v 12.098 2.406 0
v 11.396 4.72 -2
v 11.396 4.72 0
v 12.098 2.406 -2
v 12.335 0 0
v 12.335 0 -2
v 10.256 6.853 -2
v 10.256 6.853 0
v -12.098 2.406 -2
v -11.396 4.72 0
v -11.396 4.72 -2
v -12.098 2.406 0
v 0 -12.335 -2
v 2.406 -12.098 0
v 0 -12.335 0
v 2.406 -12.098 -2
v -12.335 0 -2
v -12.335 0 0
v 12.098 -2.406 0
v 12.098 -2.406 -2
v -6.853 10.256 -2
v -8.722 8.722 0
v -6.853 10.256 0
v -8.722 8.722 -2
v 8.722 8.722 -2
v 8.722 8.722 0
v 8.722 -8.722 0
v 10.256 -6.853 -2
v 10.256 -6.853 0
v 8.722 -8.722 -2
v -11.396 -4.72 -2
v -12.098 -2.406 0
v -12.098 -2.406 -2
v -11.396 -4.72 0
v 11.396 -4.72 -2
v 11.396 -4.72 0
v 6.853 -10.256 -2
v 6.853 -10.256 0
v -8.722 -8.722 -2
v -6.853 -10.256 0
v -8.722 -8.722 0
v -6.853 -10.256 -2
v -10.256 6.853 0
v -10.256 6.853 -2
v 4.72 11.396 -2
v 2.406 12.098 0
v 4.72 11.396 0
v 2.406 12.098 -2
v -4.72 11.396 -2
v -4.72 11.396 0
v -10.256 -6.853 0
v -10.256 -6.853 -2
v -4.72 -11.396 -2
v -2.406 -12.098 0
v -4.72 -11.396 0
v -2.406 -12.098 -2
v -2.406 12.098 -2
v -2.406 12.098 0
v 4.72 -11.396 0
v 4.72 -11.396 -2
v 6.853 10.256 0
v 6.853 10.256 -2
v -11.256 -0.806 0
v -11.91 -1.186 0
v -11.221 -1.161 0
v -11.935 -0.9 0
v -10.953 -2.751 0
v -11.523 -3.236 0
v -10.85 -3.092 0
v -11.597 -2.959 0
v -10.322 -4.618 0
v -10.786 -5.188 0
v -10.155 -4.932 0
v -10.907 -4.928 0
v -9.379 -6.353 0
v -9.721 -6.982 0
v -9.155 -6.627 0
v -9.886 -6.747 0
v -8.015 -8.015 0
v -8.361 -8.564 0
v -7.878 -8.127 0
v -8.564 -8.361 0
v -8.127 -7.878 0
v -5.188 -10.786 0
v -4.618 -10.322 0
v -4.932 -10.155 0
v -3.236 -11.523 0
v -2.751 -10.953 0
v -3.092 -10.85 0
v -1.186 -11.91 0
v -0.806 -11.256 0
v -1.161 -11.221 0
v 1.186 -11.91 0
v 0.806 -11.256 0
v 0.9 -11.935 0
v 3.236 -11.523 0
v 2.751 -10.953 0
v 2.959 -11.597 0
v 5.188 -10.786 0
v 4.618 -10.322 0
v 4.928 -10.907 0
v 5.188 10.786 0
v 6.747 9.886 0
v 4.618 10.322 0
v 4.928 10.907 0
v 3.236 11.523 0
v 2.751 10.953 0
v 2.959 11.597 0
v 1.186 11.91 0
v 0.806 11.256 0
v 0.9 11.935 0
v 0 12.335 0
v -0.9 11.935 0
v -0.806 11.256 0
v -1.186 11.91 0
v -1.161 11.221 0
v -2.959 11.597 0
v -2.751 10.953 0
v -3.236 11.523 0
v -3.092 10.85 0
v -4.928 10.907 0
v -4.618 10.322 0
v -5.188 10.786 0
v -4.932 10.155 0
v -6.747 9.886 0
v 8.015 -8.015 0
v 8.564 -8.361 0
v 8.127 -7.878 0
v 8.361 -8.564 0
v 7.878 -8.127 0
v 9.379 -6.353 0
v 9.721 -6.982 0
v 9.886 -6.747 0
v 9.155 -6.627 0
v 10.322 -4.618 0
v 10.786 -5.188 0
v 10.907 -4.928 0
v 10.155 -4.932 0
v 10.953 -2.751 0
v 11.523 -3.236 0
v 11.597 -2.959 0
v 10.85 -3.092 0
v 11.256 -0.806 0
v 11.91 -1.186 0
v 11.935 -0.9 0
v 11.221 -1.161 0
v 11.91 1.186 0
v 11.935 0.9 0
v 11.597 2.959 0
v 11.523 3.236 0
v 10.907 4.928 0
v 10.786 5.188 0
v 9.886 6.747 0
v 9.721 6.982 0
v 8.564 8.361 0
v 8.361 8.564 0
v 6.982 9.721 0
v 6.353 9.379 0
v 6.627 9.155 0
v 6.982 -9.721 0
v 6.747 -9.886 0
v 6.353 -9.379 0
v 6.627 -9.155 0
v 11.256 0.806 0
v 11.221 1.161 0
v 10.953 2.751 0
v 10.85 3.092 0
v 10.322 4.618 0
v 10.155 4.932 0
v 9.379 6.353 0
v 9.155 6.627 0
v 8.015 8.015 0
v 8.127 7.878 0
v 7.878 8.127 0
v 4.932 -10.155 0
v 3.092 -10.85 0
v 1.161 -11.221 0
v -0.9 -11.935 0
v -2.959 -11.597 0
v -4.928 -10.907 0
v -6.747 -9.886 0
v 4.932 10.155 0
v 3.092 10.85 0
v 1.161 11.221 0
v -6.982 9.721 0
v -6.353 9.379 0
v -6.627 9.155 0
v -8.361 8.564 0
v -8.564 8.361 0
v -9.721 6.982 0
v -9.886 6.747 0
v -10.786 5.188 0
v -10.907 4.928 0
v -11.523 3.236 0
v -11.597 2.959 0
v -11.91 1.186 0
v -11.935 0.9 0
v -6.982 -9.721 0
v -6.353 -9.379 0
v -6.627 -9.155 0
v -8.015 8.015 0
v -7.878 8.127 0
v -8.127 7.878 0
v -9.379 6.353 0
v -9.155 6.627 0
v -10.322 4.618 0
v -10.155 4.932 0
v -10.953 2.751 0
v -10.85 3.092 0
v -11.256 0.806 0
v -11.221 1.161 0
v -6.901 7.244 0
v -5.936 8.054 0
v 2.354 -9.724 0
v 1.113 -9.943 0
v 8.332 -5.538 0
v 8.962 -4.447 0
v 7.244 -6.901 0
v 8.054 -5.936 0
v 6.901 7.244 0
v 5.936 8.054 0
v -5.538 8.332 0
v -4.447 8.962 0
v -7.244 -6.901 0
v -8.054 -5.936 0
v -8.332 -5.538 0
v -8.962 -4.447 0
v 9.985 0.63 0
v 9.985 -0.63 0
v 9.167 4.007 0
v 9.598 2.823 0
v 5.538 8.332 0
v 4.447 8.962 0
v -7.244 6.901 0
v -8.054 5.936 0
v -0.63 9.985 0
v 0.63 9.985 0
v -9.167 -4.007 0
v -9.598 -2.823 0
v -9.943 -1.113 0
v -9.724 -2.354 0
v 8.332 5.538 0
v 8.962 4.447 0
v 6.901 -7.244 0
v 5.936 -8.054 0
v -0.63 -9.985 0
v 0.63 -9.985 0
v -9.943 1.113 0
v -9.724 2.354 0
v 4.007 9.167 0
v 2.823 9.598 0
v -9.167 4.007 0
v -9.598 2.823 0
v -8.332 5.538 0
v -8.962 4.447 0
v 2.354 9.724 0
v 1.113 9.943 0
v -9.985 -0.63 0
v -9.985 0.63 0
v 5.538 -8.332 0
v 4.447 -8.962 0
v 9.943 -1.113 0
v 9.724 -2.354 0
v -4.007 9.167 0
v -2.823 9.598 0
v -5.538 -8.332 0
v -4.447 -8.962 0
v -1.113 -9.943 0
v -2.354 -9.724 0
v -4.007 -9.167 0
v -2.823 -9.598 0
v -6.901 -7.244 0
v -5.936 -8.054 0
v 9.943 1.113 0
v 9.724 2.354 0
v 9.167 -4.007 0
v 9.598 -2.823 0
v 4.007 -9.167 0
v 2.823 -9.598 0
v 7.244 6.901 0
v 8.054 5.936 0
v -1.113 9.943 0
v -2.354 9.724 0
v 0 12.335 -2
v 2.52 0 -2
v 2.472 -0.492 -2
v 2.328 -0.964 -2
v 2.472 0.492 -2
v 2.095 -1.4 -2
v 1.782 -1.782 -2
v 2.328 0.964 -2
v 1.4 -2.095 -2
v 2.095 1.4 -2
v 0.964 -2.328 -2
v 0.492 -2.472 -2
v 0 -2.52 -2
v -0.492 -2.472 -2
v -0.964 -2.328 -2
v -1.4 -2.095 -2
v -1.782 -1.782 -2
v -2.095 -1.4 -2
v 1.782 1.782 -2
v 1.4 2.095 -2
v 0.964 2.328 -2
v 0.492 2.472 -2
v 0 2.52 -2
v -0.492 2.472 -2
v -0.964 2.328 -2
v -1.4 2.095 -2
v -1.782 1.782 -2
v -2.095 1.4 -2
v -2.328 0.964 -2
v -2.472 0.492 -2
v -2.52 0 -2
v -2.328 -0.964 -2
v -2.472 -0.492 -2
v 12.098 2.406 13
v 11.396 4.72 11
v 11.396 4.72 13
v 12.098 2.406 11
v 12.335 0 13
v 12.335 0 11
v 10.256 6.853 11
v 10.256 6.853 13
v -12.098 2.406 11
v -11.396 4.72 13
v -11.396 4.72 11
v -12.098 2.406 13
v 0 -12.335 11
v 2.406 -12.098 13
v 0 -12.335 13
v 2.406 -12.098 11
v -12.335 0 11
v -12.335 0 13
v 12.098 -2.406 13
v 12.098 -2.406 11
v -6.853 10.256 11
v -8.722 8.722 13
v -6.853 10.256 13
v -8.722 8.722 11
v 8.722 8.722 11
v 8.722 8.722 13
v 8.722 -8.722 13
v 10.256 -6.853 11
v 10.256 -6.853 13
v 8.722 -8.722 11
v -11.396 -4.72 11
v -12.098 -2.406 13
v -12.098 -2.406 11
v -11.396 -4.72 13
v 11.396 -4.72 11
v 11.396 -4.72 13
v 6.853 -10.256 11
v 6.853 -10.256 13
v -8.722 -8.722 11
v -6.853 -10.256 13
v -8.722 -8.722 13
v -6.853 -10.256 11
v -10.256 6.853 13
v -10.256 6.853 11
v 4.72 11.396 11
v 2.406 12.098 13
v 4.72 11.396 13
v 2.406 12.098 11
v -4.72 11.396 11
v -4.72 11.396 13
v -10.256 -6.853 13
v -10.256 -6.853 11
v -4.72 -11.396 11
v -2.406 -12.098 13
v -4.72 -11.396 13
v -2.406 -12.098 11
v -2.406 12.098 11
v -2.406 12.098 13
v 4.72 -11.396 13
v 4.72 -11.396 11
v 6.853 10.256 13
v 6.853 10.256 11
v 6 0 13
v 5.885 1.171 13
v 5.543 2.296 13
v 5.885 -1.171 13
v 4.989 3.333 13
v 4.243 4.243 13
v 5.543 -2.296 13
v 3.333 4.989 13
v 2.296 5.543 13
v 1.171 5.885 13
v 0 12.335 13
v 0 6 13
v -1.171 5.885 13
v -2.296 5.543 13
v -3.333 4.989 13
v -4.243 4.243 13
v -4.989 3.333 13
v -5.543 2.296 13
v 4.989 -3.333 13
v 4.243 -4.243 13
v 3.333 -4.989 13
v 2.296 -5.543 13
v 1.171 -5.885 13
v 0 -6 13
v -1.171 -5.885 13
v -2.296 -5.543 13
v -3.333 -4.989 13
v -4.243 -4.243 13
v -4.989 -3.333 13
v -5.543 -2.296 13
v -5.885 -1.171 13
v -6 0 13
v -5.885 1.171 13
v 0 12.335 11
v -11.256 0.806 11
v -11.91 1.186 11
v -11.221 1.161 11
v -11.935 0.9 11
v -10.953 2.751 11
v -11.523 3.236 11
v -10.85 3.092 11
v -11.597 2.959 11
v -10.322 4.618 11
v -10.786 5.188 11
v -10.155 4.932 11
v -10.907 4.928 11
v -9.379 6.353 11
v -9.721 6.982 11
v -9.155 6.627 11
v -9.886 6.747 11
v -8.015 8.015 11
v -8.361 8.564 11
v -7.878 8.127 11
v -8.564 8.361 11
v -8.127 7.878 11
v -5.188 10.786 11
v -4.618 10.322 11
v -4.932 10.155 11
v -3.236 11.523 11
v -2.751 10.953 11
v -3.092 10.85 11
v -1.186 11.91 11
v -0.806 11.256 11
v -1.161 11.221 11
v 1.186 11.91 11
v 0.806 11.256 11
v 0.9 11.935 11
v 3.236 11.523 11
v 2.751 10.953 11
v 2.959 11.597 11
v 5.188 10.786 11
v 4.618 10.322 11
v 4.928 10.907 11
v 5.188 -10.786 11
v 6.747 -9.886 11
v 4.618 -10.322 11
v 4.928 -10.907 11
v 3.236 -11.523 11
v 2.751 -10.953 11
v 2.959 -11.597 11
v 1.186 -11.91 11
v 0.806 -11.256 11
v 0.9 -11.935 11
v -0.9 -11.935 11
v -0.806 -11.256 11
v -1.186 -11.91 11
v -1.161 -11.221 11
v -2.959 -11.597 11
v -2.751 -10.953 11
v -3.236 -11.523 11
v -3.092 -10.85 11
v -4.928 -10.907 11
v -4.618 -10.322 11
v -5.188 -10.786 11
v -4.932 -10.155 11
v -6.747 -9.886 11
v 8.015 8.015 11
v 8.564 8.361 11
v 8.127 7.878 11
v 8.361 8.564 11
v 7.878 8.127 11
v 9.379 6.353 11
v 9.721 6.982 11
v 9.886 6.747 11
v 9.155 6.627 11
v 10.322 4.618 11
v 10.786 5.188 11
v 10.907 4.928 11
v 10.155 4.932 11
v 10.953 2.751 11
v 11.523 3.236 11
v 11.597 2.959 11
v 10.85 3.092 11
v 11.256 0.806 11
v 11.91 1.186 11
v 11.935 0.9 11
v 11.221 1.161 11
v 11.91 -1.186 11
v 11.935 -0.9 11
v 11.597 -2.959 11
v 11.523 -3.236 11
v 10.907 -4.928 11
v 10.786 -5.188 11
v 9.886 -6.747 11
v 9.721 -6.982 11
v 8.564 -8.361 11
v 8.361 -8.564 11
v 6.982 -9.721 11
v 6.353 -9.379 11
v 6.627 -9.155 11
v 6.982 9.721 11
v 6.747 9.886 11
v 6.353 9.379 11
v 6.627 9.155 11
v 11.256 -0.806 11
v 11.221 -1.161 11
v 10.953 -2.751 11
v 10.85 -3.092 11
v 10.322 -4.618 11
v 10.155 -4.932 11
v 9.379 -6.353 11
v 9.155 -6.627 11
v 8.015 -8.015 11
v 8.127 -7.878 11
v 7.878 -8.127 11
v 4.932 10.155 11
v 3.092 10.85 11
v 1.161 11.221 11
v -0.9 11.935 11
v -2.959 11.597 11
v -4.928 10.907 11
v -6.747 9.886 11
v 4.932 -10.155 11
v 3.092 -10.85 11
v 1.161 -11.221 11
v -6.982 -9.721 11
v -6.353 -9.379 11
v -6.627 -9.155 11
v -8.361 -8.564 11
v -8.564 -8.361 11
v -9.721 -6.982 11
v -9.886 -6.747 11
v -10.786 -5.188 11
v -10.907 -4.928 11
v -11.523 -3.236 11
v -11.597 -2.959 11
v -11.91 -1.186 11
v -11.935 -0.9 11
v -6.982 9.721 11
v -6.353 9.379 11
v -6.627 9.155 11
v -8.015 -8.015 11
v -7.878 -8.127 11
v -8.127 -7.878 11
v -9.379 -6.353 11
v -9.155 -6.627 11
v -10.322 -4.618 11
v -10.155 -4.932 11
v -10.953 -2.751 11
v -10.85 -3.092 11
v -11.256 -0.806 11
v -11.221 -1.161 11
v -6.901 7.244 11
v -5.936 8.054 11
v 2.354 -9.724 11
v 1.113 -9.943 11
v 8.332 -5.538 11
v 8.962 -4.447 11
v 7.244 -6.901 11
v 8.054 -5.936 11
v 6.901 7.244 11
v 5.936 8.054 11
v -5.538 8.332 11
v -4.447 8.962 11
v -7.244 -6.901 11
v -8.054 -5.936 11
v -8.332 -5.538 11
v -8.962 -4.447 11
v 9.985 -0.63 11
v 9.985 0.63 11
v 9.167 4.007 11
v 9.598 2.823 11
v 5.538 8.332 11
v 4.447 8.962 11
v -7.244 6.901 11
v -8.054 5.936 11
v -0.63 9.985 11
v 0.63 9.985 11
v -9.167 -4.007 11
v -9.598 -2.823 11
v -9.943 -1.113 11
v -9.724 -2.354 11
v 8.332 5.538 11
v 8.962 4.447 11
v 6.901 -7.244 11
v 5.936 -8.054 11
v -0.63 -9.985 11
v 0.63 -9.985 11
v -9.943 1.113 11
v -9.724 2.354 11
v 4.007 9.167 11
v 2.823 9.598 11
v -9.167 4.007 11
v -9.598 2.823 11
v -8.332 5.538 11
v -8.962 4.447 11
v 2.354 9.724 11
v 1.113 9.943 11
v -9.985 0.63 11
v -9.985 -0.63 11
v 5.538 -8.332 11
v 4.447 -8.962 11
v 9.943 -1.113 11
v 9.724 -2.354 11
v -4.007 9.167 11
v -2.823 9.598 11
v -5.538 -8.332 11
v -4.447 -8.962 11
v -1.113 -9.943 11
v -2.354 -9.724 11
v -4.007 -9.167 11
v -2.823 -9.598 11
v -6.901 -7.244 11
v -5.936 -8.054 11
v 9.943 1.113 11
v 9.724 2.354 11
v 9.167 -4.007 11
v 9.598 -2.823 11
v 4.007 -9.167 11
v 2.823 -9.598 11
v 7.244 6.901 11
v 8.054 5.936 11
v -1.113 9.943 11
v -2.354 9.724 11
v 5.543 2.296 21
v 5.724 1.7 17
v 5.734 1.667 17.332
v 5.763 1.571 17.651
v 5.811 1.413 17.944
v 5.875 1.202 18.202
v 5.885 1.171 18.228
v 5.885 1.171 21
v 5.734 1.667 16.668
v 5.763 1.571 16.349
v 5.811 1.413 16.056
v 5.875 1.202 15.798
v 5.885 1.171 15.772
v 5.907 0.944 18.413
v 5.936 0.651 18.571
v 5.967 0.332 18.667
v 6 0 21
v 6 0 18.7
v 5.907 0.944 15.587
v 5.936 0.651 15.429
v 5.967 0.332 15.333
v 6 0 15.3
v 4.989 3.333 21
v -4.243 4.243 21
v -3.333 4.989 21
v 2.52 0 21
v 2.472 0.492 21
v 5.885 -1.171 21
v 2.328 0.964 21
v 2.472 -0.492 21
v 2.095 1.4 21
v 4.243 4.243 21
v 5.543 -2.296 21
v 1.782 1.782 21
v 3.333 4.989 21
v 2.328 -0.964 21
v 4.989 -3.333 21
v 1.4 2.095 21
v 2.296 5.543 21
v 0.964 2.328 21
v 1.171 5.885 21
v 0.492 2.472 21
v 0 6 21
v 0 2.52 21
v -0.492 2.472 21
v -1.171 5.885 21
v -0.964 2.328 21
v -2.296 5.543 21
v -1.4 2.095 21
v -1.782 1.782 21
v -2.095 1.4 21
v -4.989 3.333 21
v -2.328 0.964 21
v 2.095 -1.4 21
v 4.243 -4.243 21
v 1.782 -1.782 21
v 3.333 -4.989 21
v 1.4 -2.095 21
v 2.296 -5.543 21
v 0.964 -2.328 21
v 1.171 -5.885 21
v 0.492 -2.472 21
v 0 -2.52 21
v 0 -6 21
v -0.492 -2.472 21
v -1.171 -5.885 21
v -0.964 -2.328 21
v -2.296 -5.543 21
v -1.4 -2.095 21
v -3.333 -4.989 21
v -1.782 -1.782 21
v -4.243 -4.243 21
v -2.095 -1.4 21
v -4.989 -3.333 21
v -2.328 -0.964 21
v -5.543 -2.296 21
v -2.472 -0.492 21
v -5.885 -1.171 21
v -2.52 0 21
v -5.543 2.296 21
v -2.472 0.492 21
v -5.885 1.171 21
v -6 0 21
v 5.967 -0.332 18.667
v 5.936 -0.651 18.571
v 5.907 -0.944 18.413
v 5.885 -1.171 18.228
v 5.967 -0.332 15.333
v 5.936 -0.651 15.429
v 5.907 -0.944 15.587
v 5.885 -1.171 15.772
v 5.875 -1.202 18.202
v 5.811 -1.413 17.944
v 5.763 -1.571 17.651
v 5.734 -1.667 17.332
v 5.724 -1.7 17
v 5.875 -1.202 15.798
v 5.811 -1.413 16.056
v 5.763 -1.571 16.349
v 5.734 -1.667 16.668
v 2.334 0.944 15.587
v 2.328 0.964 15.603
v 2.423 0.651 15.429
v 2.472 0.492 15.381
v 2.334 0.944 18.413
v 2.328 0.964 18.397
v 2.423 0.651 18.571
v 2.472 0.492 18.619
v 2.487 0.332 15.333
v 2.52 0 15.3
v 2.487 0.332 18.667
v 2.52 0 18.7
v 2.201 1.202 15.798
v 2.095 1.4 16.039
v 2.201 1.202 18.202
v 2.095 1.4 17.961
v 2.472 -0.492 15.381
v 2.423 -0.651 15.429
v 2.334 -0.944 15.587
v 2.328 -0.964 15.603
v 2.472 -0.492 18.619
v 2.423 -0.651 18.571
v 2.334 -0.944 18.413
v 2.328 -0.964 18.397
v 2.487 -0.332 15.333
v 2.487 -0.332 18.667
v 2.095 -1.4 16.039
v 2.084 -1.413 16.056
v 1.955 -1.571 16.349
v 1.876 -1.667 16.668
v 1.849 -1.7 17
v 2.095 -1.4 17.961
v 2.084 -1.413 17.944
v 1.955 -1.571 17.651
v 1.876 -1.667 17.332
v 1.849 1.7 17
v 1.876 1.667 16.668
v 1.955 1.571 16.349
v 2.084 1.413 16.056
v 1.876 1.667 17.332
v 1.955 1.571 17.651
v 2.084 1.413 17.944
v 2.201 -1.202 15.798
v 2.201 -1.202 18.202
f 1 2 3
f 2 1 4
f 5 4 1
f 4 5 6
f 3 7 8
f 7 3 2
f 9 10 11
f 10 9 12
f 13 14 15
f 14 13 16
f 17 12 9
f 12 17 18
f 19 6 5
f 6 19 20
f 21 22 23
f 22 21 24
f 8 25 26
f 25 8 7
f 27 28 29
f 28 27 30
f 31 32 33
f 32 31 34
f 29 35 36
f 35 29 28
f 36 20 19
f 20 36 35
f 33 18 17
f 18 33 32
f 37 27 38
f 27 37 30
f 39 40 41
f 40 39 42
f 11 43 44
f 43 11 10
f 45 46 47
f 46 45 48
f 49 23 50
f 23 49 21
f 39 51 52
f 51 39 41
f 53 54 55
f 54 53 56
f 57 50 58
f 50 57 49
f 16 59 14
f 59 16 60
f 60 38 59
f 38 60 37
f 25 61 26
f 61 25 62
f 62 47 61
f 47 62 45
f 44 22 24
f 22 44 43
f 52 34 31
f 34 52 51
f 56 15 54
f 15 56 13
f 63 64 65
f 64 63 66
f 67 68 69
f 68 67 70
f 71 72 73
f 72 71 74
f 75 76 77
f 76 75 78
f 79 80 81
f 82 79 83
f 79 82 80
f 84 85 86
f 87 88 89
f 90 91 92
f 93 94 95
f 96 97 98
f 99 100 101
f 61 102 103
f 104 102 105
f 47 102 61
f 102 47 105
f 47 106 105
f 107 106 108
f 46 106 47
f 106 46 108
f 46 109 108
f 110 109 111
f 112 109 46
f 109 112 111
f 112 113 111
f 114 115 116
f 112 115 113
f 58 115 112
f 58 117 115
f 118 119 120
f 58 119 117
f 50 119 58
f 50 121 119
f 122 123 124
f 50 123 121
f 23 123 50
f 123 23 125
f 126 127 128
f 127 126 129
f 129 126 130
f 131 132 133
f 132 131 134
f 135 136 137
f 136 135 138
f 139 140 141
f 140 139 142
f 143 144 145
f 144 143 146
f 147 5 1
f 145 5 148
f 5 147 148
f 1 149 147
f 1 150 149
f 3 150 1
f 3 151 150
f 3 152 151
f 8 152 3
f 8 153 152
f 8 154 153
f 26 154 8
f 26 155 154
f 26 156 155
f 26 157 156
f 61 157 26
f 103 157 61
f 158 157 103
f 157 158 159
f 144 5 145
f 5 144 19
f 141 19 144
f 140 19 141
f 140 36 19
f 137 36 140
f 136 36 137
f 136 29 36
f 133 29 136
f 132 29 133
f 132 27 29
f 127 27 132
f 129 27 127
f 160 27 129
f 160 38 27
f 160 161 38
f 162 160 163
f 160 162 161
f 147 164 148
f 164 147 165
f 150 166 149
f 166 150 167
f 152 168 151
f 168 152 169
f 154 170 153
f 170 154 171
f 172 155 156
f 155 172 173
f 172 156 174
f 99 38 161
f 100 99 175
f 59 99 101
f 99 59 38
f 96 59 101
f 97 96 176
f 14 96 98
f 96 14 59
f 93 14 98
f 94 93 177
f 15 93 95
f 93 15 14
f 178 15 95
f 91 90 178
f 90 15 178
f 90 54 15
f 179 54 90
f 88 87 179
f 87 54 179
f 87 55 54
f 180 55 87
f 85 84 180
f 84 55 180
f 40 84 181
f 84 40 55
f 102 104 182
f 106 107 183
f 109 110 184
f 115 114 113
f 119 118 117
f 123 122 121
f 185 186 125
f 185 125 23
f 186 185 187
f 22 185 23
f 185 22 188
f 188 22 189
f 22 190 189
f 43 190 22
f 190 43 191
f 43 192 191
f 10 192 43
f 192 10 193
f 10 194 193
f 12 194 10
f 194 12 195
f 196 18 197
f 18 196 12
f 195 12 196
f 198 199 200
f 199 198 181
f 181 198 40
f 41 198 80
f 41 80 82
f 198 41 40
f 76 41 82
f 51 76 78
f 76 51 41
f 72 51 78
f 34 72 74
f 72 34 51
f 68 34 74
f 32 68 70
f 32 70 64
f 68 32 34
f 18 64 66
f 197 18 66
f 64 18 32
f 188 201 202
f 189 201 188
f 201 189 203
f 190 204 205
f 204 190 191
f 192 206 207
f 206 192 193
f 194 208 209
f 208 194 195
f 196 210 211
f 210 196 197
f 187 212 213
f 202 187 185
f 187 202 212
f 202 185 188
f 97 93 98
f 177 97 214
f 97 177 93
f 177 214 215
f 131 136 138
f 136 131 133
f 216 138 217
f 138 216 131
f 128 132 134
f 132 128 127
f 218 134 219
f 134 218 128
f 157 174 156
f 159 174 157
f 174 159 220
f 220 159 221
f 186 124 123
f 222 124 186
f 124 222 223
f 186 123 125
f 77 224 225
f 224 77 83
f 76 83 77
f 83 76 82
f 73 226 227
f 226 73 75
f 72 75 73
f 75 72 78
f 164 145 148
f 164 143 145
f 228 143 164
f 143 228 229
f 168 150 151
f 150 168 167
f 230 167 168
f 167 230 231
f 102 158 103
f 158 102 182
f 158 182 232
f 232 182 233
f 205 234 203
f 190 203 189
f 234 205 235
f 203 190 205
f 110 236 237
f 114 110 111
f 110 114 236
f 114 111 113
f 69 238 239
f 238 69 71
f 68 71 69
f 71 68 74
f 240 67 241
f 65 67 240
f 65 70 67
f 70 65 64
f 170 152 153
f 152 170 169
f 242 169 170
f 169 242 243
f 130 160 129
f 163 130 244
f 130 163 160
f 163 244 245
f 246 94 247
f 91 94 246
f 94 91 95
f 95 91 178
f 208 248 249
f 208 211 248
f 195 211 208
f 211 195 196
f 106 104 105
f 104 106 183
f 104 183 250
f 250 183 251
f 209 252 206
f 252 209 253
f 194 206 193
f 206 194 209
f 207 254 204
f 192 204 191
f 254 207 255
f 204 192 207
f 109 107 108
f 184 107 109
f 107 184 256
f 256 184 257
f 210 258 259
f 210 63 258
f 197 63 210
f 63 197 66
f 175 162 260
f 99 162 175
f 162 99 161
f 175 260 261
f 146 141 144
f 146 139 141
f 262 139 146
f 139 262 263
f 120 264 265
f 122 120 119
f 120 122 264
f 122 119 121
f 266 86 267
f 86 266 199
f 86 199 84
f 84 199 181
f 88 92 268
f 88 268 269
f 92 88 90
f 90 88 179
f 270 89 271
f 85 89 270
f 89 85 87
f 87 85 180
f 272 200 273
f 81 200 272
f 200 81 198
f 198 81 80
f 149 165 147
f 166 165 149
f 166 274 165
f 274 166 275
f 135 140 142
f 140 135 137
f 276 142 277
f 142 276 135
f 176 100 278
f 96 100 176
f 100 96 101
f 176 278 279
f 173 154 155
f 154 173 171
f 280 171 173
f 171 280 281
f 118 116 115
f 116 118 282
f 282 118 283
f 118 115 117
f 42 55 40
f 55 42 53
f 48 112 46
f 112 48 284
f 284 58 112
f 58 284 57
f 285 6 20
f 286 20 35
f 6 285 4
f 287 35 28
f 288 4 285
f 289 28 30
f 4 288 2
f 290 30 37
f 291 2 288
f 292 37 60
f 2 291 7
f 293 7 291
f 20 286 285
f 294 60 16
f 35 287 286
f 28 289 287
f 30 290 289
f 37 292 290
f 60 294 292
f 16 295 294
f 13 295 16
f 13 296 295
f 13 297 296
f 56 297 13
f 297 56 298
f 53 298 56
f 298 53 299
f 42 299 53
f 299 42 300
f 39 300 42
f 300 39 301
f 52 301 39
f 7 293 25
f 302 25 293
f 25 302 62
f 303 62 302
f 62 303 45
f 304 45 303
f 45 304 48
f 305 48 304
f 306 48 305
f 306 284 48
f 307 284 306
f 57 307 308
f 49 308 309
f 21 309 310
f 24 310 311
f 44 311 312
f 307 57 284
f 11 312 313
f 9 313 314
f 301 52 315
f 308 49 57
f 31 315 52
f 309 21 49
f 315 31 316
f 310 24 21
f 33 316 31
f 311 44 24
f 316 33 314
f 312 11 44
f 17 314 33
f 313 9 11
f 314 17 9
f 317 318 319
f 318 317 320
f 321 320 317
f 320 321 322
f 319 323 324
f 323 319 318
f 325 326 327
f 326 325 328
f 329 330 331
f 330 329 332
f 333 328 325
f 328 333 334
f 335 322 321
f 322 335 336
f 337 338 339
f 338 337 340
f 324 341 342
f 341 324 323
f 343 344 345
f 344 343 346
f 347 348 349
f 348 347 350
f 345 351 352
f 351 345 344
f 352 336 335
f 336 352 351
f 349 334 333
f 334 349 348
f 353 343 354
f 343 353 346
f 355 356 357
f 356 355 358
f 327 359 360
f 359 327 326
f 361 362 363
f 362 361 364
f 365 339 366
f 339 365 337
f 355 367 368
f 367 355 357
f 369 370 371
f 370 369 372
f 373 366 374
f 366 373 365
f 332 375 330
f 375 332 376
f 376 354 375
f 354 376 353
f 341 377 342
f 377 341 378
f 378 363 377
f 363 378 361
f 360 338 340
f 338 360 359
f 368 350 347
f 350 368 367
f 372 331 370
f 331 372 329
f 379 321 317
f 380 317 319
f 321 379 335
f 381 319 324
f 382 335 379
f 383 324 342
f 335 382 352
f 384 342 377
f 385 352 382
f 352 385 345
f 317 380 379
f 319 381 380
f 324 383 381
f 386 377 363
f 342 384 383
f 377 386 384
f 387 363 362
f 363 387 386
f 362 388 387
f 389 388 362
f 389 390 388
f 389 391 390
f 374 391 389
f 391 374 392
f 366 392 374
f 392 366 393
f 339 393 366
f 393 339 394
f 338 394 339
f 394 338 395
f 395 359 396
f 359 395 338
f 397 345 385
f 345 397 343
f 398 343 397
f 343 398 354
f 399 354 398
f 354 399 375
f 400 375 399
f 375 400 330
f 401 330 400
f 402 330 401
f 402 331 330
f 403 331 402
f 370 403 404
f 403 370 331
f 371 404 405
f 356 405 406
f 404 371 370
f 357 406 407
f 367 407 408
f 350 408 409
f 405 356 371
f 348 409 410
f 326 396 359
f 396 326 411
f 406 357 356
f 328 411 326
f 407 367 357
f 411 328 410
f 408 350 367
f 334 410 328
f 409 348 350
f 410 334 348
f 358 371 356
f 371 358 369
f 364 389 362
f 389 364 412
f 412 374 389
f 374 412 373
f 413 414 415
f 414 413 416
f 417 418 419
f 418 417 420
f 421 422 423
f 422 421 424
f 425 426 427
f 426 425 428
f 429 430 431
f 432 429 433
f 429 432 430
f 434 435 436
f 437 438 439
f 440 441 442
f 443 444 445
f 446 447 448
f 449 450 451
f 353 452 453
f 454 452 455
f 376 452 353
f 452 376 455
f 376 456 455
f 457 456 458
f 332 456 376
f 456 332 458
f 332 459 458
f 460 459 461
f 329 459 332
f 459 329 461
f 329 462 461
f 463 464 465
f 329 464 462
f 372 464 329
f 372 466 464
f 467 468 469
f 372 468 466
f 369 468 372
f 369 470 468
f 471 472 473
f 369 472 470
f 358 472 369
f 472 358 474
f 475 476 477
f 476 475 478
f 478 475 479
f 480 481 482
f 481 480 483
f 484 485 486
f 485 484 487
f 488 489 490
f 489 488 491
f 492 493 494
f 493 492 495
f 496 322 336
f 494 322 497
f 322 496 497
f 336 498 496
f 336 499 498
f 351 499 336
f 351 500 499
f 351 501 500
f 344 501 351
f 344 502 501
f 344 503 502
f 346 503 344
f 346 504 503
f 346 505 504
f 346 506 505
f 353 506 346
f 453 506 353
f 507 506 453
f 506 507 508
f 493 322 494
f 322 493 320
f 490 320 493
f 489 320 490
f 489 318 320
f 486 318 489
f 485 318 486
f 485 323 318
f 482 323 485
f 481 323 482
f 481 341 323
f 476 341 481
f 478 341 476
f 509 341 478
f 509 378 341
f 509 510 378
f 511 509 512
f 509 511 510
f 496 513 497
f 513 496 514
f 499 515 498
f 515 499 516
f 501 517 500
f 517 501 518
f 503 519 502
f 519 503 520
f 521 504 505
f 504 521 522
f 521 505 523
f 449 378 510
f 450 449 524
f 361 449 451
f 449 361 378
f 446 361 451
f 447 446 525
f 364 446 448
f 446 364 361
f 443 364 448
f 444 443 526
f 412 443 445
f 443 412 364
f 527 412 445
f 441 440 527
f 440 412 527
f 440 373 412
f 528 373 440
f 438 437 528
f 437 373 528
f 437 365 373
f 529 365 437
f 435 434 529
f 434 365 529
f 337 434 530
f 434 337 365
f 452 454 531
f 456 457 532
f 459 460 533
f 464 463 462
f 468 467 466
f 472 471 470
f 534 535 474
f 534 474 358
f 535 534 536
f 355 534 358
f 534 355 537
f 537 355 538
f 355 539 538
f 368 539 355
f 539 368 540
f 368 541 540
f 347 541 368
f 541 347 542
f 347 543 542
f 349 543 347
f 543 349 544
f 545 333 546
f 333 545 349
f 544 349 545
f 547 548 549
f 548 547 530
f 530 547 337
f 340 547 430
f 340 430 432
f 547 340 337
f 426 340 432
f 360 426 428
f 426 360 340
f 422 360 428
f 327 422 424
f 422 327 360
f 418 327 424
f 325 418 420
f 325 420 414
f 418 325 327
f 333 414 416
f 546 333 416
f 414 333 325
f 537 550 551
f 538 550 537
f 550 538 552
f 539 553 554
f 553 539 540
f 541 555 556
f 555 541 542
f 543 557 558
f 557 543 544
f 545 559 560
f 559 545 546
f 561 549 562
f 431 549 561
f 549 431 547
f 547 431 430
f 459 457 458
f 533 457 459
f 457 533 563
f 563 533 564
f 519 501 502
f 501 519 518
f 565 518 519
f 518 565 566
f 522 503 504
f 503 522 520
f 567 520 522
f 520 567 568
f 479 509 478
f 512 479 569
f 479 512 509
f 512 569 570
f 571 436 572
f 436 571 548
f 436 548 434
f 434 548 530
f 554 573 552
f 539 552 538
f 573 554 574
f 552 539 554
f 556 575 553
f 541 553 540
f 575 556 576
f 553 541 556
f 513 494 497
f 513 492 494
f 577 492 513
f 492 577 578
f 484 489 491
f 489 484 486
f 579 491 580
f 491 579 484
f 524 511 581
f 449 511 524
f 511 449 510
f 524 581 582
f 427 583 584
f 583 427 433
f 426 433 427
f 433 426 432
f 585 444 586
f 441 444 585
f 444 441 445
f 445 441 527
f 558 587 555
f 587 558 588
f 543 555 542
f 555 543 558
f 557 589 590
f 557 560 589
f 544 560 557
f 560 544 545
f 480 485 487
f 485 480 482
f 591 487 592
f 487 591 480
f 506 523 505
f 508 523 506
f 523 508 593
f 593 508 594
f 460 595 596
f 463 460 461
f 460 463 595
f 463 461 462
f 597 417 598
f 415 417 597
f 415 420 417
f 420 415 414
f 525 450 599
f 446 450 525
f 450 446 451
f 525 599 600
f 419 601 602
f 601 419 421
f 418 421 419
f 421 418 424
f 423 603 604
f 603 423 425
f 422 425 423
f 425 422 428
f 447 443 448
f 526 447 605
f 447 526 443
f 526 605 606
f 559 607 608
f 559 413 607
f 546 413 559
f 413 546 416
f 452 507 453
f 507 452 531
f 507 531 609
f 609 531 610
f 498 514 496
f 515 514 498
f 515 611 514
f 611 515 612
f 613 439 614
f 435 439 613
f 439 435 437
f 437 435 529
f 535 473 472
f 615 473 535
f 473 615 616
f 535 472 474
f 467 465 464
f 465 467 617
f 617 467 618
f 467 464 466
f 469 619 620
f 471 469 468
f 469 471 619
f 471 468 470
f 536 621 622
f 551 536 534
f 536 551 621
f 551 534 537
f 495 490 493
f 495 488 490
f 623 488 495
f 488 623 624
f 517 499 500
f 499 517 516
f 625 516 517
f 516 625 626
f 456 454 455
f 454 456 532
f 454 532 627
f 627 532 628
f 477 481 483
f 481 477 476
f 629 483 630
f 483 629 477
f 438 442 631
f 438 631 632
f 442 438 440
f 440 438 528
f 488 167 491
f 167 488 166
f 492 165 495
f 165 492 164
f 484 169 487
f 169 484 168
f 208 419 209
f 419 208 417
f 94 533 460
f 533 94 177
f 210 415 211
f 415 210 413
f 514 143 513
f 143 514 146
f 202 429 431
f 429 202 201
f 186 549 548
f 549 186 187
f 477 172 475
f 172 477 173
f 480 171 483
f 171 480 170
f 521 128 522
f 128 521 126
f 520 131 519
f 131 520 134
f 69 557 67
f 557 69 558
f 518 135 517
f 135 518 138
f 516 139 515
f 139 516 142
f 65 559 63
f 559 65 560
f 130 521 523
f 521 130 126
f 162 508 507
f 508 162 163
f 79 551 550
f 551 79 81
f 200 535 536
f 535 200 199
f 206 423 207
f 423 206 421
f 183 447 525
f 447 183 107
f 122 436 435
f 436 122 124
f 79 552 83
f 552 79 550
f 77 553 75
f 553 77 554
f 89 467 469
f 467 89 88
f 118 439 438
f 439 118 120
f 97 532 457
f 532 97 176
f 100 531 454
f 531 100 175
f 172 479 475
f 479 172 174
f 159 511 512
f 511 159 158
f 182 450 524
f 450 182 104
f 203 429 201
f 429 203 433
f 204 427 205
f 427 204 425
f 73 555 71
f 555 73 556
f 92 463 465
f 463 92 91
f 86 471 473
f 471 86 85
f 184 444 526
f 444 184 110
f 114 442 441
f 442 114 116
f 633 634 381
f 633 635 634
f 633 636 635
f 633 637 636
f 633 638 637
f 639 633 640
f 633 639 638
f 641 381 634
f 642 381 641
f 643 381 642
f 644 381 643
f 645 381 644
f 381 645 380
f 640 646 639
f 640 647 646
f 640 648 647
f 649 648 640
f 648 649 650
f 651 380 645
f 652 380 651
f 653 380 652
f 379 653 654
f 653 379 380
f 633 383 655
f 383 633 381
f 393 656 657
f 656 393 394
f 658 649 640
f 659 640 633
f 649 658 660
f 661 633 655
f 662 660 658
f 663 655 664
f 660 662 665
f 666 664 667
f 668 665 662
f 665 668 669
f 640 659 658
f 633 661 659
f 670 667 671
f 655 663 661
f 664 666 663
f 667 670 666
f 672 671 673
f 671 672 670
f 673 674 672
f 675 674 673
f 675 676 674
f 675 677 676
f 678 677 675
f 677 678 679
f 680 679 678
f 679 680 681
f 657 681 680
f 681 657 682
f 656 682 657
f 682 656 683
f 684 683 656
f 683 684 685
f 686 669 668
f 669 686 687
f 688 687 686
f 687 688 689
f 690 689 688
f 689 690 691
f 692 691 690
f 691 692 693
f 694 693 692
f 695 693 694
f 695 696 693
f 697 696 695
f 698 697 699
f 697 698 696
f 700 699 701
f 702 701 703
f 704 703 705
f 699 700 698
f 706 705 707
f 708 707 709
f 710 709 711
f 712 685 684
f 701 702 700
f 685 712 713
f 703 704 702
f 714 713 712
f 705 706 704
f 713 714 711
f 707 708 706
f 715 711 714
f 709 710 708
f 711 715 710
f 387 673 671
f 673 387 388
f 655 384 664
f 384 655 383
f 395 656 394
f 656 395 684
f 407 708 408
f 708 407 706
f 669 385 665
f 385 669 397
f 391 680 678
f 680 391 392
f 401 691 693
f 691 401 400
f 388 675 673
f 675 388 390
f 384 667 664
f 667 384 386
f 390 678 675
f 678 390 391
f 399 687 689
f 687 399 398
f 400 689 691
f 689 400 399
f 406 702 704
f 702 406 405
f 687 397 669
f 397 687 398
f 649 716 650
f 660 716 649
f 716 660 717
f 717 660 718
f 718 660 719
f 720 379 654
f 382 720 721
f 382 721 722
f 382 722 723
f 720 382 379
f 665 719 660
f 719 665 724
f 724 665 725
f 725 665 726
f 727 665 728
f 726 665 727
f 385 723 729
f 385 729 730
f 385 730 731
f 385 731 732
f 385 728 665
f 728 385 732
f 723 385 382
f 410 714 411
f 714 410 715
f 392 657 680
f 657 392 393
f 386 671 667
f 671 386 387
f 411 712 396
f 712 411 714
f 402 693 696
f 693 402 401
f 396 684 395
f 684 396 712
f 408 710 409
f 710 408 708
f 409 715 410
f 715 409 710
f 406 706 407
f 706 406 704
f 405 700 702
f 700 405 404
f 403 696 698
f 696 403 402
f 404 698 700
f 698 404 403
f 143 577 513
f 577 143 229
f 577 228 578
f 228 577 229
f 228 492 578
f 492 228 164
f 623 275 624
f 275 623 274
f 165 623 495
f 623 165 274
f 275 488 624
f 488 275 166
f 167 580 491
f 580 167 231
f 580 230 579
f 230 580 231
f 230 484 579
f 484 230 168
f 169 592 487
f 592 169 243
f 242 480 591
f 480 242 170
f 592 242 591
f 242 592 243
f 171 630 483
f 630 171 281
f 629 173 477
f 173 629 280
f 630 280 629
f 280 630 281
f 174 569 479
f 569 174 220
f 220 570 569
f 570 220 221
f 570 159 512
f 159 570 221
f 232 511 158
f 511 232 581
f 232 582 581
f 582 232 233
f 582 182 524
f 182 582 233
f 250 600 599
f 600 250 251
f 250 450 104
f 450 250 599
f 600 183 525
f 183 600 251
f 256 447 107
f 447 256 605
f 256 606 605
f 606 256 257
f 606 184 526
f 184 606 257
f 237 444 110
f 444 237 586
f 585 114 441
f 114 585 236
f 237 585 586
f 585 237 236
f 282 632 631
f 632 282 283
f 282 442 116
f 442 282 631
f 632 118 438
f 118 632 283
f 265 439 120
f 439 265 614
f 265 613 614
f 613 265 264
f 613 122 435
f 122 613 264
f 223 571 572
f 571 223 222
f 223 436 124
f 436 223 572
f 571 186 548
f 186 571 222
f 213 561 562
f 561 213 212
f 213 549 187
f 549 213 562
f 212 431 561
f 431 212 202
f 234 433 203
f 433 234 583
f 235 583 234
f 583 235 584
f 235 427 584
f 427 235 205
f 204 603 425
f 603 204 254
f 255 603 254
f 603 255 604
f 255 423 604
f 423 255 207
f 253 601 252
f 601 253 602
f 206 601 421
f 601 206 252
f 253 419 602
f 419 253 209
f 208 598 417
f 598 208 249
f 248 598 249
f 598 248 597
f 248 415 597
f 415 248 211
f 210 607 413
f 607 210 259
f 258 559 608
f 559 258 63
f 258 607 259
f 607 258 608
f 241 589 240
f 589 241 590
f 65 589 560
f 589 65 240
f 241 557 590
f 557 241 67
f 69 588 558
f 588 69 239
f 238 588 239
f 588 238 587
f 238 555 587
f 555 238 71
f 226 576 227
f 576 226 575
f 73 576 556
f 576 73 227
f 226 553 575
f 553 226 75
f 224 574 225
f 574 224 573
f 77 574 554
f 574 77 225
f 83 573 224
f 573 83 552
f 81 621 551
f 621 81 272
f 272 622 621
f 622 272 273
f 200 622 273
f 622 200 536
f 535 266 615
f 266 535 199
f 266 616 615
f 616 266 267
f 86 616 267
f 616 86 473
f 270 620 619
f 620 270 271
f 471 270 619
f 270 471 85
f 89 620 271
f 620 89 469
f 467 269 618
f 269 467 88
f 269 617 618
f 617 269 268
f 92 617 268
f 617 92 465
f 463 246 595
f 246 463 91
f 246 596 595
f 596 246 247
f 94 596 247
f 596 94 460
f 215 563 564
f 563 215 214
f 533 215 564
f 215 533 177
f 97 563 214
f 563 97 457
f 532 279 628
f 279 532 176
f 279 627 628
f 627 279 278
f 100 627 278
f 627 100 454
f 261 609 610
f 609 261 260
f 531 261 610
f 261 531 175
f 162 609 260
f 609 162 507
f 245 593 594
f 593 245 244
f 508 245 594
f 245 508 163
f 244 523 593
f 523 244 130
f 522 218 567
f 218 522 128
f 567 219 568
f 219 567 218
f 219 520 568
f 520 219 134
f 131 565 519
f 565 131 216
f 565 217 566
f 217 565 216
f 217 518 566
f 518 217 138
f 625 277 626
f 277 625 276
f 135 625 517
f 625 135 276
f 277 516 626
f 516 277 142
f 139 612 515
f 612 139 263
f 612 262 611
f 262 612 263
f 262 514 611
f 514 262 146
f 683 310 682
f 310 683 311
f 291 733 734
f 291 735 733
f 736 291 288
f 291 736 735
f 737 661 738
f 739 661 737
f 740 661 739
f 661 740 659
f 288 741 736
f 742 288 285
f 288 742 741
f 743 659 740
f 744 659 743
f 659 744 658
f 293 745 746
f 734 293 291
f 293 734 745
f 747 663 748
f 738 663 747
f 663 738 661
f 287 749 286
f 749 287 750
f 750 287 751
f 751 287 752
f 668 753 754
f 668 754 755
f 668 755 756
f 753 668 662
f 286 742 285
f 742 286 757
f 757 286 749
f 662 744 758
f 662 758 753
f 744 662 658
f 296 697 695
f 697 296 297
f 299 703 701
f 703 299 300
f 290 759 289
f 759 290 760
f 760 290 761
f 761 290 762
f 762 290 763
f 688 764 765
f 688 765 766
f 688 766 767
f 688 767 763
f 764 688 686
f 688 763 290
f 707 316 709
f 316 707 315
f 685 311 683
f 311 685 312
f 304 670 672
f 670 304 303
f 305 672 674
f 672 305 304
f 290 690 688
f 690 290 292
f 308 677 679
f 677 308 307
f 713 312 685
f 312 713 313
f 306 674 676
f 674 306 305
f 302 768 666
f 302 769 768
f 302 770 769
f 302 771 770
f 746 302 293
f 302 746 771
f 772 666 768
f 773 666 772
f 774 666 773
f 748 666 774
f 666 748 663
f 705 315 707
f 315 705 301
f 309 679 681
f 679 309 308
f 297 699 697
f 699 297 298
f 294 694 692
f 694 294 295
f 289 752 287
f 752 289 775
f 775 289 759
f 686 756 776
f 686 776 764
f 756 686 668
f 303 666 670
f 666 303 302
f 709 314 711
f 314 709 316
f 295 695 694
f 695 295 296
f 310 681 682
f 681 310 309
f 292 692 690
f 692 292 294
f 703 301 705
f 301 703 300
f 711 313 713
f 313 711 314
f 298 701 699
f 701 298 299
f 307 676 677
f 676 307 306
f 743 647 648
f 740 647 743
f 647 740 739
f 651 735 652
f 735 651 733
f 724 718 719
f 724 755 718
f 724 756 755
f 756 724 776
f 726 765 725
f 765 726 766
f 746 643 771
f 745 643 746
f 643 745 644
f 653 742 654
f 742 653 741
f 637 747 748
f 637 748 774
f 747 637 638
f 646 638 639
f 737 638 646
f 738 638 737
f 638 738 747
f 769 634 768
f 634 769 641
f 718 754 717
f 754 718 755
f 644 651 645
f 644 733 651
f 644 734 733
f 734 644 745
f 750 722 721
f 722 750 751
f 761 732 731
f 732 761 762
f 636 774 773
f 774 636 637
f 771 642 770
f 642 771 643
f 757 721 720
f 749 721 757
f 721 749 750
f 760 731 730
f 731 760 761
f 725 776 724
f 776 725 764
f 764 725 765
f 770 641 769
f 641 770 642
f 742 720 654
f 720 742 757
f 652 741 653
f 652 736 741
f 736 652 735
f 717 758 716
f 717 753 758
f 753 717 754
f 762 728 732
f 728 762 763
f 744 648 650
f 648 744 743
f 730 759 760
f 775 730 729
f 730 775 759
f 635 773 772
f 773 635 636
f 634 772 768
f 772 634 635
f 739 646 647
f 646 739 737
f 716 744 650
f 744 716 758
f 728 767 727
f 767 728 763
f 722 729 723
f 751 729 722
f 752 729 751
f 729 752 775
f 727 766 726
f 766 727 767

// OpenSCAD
$fn = 32;

// ----------------------------------------------------------------------
// Timing pulley: GT2 36T, pitch 2 mm, 24.67 mm x 23 mm
// ----------------------------------------------------------------------

// --- parameters (mm) ---
pitch_mm = 2;             // belt pitch
tooth_count = 36;         // number of grooves
width = 11;               // belt width between the flanges
tip_d = 22.67;            // tip circle diameter
root_d = 21.17;           // groove bottom diameter
groove_h = 0.75;          // groove depth
tooth_w = 1.5;            // groove width at the tip circle
side_d = 24.67;           // flange diameter
side_t = 2;               // flange thickness
spigot_d = 19.57;         // flange spigot, sunk into the rim
spigot_h = 1.2;           // spigot depth into the rim
hub_bore = 5.04;          // shaft bore
hub_d = 12;               // hub diameter
hub_h = 8;                // hub above the flange
bottom_z = -2;            // lowest point of the pulley
top_z = 21;               // highest point of the pulley
set_d = 3.4;              // set screw tap hole

module rim() {
  cylinder(h = width, d = tip_d);
}

module groove_cutter() {
  /* belt tooth groove: deeper than wide, cut through the belt width */
  translate([root_d / 2, 0, 0])
    linear_extrude(height = width)
      polygon(points = [[-0.6, -tooth_w * 0.42], [groove_h + 0.6, -tooth_w * 0.6],
                        [groove_h + 0.6, tooth_w * 0.6], [-0.6, tooth_w * 0.42]]);
}

module flanges() {
  translate([0, 0, -side_t]) cylinder(h = side_t, d = side_d);
  translate([0, 0, width]) cylinder(h = side_t, d = side_d);
  translate([0, 0, -spigot_h]) cylinder(h = spigot_h + 0.6, d = spigot_d);
  translate([0, 0, width - 0.6]) cylinder(h = spigot_h + 0.6, d = spigot_d);
}

module hub() {
  translate([0, 0, bottom_z]) cylinder(h = top_z - bottom_z, d = hub_d);
}

difference() {
  union() {
    rim();
    hub();
    flanges();
  }
  for (i = [0 : tooth_count - 1]) rotate([0, 0, i * 360 / tooth_count]) groove_cutter();
  translate([0, 0, bottom_z - 1]) cylinder(h = top_z - bottom_z + 2, d = hub_bore);
  translate([-1, 0, top_z - hub_h * 0.5]) rotate([0, 90, 0]) cylinder(h = hub_d / 2 + 3, d = set_d);
}
